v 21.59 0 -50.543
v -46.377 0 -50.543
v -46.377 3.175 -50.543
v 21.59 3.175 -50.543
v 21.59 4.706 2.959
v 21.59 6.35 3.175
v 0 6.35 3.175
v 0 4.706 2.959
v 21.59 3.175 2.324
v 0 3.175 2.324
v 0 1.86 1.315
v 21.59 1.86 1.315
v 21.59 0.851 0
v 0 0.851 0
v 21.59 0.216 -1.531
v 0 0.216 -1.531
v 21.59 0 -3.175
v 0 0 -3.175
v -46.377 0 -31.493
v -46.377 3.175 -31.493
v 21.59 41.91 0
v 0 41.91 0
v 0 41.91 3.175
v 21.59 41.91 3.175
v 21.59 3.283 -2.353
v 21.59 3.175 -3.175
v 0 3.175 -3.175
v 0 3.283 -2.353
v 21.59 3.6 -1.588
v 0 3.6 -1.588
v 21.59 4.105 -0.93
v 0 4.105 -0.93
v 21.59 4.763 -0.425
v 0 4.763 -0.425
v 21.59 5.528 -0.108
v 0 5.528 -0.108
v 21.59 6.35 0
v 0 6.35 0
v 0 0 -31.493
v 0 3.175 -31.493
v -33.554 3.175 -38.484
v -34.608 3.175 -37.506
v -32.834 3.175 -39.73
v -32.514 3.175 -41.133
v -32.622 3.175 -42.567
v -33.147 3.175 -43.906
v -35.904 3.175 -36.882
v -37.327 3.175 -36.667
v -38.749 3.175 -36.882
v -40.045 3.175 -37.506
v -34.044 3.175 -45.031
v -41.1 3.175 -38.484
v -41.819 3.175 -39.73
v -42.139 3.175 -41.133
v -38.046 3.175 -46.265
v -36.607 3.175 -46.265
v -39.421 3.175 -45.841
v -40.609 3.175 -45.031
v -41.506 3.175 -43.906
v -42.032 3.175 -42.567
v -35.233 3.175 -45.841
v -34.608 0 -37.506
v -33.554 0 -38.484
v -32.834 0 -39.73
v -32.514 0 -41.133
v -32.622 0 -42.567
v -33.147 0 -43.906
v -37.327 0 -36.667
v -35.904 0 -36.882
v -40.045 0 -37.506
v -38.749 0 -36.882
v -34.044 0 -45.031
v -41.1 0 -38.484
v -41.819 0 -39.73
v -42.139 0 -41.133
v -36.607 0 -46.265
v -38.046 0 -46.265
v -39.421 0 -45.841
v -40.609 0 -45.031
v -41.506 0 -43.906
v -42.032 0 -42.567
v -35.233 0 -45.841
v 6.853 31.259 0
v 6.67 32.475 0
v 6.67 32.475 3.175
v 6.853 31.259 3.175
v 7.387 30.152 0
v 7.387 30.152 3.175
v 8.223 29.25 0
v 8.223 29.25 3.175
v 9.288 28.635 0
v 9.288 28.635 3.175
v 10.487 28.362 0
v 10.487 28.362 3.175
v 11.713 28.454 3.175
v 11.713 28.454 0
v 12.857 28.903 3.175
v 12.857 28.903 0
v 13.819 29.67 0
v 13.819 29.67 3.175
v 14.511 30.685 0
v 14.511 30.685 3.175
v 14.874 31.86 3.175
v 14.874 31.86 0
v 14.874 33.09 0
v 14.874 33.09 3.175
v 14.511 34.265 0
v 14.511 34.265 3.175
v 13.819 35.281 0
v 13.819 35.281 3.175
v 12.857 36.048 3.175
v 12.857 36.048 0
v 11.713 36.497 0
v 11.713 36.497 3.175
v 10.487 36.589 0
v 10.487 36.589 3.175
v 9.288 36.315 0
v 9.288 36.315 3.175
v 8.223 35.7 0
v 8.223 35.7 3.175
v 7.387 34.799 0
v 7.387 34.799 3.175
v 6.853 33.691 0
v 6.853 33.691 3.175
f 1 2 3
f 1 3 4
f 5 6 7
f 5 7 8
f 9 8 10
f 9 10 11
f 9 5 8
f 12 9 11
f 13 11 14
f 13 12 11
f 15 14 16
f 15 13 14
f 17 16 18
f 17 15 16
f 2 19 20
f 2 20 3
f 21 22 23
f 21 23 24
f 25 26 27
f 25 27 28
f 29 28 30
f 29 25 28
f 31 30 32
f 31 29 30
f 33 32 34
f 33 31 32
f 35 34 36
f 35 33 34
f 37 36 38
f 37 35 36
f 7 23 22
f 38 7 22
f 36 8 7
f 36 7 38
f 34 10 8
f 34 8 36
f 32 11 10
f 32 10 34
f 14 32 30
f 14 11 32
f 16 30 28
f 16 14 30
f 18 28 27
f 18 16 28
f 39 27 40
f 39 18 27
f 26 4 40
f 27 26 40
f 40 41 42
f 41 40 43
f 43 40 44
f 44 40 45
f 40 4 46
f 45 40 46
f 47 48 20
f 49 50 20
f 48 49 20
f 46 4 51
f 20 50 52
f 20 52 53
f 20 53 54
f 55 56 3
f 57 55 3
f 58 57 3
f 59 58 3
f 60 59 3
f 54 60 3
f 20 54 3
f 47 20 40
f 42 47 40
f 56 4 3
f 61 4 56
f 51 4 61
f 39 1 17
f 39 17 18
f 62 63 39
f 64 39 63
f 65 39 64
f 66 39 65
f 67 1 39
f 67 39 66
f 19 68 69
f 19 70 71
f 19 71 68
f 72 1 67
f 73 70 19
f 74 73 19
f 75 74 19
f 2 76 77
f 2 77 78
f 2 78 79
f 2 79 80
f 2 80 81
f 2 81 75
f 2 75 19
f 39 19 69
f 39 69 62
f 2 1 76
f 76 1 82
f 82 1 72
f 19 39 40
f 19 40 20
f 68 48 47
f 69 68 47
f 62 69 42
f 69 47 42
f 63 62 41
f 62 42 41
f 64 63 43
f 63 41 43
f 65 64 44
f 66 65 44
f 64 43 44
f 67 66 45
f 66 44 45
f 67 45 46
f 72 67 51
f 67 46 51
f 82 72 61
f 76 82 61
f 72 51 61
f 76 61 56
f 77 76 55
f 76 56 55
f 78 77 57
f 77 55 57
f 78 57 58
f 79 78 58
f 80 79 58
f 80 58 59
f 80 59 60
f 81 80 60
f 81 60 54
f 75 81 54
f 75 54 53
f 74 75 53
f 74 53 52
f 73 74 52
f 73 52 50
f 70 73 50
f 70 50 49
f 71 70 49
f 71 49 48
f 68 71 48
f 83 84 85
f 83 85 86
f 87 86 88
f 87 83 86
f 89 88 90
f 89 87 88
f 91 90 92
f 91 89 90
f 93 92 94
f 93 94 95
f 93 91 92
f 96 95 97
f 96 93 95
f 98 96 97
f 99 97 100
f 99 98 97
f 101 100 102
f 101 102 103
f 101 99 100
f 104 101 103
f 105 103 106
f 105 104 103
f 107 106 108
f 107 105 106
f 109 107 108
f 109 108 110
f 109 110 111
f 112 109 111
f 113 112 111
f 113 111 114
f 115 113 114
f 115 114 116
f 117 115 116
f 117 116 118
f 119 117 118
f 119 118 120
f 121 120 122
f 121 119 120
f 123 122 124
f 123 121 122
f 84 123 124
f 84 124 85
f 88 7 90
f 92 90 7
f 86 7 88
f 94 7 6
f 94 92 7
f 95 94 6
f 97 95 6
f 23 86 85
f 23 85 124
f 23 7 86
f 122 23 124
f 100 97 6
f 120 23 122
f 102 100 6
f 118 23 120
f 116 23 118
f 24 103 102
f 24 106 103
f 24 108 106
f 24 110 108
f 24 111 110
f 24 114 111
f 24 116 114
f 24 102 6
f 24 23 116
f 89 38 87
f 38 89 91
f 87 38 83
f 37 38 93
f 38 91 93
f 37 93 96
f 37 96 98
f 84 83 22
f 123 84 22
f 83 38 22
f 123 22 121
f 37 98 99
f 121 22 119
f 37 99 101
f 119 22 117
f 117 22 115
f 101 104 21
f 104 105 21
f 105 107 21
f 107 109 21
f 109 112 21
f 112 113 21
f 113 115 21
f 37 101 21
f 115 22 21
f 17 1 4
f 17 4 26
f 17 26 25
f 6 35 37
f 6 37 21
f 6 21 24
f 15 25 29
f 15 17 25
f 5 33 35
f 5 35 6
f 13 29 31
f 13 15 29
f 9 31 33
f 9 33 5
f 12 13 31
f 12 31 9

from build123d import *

# Parameters (mm, degrees)
SKETCH1_W                    = 21.59
SKETCH1_H                    = 41.91
SKETCH1_R                    = 4.124999878
BOSS_EXTRUDE1_DEPTH          = 3.175
EDGE_FLANGE2_STRIP_W         = 19.05
EDGE_FLANGE2_STRIP_H         = 3.175
EDGE_FLANGE2_STRIP_CUT_DEPTH = 21.59
EDGE_FLANGE2_DEPTH           = 21.59
EDGE_FLANGE2_FLAT_DEPTH      = 3.175
SKETCH12_R                   = 4.826
CUT_EXTRUDE1_DEPTH           = 79.776992708


# Sheet-metal steps are written as plain solids
with BuildPart() as part:
    # Sketch1 → Boss-Extrude1 (new body)
    with BuildSketch(Plane.XY):
        with Locations((10.795, 20.955)):
            Rectangle(SKETCH1_W, SKETCH1_H)
        with Locations(Location((10.795, 32.475227484, 0), (0, 0, 180))):
            Circle(SKETCH1_R, mode=Mode.SUBTRACT)
    extrude(amount=BOSS_EXTRUDE1_DEPTH)

    # Edge-Flange2 strip (across the edge) → Edge-Flange2 strip cut (cut)
    with BuildSketch(Plane(origin=(21.59, 0, 0), x_dir=(0, 1, 0), z_dir=(-1, 0, 0))):
        with Locations((-3.175, -1.5875)):
            Rectangle(EDGE_FLANGE2_STRIP_W, EDGE_FLANGE2_STRIP_H)
    extrude(amount=EDGE_FLANGE2_STRIP_CUT_DEPTH, mode=Mode.SUBTRACT)

    # Edge-Flange2 bend section (across the edge) → Edge-Flange2 (add)
    with BuildSketch(Plane(origin=(21.59, 0, 0), x_dir=(0, 1, 0), z_dir=(-1, 0, 0))):
        with BuildLine():
            Line((0, 3.175), (3.175, 3.175))
            ThreePointArc((3.175, 3.175), (4.10493597, 0.92993597), (6.35, 0))
            Line((6.35, 0), (6.35, -3.175))
            ThreePointArc((6.35, -3.175), (1.859871939, -1.315128061), (0, 3.175))
        make_face()
    extrude(amount=EDGE_FLANGE2_DEPTH)

    # Edge-Flange2 profile (on flange) → Edge-Flange2 flat (add)
    with BuildSketch(Plane(origin=(0, 0, 0), x_dir=(-1, 0, 0), z_dir=(0, -1, 0))):
        Polygon((0, 3.175), (0, 31.493260102), (27.326645128, 31.493260102), (46.376645128, 31.493260102), (46.376645128, 50.543260102), (27.326645128, 50.543260102), (0, 50.543260102), (-21.59, 50.543260102), (-21.59, 3.175), align=None)
    extrude(amount=-EDGE_FLANGE2_FLAT_DEPTH)

    # Sketch12 → Cut-Extrude1 (cut, through all)
    with BuildSketch(Plane(origin=(0, 3.175, 0), x_dir=(1, 0, 0), z_dir=(0, 1, 0))):
        with Locations(Location((-37.326625128, 41.493240102, 0), (0, 0, 270))):
            Circle(SKETCH12_R)
    extrude(amount=-CUT_EXTRUDE1_DEPTH, mode=Mode.SUBTRACT)


solid = part.part
